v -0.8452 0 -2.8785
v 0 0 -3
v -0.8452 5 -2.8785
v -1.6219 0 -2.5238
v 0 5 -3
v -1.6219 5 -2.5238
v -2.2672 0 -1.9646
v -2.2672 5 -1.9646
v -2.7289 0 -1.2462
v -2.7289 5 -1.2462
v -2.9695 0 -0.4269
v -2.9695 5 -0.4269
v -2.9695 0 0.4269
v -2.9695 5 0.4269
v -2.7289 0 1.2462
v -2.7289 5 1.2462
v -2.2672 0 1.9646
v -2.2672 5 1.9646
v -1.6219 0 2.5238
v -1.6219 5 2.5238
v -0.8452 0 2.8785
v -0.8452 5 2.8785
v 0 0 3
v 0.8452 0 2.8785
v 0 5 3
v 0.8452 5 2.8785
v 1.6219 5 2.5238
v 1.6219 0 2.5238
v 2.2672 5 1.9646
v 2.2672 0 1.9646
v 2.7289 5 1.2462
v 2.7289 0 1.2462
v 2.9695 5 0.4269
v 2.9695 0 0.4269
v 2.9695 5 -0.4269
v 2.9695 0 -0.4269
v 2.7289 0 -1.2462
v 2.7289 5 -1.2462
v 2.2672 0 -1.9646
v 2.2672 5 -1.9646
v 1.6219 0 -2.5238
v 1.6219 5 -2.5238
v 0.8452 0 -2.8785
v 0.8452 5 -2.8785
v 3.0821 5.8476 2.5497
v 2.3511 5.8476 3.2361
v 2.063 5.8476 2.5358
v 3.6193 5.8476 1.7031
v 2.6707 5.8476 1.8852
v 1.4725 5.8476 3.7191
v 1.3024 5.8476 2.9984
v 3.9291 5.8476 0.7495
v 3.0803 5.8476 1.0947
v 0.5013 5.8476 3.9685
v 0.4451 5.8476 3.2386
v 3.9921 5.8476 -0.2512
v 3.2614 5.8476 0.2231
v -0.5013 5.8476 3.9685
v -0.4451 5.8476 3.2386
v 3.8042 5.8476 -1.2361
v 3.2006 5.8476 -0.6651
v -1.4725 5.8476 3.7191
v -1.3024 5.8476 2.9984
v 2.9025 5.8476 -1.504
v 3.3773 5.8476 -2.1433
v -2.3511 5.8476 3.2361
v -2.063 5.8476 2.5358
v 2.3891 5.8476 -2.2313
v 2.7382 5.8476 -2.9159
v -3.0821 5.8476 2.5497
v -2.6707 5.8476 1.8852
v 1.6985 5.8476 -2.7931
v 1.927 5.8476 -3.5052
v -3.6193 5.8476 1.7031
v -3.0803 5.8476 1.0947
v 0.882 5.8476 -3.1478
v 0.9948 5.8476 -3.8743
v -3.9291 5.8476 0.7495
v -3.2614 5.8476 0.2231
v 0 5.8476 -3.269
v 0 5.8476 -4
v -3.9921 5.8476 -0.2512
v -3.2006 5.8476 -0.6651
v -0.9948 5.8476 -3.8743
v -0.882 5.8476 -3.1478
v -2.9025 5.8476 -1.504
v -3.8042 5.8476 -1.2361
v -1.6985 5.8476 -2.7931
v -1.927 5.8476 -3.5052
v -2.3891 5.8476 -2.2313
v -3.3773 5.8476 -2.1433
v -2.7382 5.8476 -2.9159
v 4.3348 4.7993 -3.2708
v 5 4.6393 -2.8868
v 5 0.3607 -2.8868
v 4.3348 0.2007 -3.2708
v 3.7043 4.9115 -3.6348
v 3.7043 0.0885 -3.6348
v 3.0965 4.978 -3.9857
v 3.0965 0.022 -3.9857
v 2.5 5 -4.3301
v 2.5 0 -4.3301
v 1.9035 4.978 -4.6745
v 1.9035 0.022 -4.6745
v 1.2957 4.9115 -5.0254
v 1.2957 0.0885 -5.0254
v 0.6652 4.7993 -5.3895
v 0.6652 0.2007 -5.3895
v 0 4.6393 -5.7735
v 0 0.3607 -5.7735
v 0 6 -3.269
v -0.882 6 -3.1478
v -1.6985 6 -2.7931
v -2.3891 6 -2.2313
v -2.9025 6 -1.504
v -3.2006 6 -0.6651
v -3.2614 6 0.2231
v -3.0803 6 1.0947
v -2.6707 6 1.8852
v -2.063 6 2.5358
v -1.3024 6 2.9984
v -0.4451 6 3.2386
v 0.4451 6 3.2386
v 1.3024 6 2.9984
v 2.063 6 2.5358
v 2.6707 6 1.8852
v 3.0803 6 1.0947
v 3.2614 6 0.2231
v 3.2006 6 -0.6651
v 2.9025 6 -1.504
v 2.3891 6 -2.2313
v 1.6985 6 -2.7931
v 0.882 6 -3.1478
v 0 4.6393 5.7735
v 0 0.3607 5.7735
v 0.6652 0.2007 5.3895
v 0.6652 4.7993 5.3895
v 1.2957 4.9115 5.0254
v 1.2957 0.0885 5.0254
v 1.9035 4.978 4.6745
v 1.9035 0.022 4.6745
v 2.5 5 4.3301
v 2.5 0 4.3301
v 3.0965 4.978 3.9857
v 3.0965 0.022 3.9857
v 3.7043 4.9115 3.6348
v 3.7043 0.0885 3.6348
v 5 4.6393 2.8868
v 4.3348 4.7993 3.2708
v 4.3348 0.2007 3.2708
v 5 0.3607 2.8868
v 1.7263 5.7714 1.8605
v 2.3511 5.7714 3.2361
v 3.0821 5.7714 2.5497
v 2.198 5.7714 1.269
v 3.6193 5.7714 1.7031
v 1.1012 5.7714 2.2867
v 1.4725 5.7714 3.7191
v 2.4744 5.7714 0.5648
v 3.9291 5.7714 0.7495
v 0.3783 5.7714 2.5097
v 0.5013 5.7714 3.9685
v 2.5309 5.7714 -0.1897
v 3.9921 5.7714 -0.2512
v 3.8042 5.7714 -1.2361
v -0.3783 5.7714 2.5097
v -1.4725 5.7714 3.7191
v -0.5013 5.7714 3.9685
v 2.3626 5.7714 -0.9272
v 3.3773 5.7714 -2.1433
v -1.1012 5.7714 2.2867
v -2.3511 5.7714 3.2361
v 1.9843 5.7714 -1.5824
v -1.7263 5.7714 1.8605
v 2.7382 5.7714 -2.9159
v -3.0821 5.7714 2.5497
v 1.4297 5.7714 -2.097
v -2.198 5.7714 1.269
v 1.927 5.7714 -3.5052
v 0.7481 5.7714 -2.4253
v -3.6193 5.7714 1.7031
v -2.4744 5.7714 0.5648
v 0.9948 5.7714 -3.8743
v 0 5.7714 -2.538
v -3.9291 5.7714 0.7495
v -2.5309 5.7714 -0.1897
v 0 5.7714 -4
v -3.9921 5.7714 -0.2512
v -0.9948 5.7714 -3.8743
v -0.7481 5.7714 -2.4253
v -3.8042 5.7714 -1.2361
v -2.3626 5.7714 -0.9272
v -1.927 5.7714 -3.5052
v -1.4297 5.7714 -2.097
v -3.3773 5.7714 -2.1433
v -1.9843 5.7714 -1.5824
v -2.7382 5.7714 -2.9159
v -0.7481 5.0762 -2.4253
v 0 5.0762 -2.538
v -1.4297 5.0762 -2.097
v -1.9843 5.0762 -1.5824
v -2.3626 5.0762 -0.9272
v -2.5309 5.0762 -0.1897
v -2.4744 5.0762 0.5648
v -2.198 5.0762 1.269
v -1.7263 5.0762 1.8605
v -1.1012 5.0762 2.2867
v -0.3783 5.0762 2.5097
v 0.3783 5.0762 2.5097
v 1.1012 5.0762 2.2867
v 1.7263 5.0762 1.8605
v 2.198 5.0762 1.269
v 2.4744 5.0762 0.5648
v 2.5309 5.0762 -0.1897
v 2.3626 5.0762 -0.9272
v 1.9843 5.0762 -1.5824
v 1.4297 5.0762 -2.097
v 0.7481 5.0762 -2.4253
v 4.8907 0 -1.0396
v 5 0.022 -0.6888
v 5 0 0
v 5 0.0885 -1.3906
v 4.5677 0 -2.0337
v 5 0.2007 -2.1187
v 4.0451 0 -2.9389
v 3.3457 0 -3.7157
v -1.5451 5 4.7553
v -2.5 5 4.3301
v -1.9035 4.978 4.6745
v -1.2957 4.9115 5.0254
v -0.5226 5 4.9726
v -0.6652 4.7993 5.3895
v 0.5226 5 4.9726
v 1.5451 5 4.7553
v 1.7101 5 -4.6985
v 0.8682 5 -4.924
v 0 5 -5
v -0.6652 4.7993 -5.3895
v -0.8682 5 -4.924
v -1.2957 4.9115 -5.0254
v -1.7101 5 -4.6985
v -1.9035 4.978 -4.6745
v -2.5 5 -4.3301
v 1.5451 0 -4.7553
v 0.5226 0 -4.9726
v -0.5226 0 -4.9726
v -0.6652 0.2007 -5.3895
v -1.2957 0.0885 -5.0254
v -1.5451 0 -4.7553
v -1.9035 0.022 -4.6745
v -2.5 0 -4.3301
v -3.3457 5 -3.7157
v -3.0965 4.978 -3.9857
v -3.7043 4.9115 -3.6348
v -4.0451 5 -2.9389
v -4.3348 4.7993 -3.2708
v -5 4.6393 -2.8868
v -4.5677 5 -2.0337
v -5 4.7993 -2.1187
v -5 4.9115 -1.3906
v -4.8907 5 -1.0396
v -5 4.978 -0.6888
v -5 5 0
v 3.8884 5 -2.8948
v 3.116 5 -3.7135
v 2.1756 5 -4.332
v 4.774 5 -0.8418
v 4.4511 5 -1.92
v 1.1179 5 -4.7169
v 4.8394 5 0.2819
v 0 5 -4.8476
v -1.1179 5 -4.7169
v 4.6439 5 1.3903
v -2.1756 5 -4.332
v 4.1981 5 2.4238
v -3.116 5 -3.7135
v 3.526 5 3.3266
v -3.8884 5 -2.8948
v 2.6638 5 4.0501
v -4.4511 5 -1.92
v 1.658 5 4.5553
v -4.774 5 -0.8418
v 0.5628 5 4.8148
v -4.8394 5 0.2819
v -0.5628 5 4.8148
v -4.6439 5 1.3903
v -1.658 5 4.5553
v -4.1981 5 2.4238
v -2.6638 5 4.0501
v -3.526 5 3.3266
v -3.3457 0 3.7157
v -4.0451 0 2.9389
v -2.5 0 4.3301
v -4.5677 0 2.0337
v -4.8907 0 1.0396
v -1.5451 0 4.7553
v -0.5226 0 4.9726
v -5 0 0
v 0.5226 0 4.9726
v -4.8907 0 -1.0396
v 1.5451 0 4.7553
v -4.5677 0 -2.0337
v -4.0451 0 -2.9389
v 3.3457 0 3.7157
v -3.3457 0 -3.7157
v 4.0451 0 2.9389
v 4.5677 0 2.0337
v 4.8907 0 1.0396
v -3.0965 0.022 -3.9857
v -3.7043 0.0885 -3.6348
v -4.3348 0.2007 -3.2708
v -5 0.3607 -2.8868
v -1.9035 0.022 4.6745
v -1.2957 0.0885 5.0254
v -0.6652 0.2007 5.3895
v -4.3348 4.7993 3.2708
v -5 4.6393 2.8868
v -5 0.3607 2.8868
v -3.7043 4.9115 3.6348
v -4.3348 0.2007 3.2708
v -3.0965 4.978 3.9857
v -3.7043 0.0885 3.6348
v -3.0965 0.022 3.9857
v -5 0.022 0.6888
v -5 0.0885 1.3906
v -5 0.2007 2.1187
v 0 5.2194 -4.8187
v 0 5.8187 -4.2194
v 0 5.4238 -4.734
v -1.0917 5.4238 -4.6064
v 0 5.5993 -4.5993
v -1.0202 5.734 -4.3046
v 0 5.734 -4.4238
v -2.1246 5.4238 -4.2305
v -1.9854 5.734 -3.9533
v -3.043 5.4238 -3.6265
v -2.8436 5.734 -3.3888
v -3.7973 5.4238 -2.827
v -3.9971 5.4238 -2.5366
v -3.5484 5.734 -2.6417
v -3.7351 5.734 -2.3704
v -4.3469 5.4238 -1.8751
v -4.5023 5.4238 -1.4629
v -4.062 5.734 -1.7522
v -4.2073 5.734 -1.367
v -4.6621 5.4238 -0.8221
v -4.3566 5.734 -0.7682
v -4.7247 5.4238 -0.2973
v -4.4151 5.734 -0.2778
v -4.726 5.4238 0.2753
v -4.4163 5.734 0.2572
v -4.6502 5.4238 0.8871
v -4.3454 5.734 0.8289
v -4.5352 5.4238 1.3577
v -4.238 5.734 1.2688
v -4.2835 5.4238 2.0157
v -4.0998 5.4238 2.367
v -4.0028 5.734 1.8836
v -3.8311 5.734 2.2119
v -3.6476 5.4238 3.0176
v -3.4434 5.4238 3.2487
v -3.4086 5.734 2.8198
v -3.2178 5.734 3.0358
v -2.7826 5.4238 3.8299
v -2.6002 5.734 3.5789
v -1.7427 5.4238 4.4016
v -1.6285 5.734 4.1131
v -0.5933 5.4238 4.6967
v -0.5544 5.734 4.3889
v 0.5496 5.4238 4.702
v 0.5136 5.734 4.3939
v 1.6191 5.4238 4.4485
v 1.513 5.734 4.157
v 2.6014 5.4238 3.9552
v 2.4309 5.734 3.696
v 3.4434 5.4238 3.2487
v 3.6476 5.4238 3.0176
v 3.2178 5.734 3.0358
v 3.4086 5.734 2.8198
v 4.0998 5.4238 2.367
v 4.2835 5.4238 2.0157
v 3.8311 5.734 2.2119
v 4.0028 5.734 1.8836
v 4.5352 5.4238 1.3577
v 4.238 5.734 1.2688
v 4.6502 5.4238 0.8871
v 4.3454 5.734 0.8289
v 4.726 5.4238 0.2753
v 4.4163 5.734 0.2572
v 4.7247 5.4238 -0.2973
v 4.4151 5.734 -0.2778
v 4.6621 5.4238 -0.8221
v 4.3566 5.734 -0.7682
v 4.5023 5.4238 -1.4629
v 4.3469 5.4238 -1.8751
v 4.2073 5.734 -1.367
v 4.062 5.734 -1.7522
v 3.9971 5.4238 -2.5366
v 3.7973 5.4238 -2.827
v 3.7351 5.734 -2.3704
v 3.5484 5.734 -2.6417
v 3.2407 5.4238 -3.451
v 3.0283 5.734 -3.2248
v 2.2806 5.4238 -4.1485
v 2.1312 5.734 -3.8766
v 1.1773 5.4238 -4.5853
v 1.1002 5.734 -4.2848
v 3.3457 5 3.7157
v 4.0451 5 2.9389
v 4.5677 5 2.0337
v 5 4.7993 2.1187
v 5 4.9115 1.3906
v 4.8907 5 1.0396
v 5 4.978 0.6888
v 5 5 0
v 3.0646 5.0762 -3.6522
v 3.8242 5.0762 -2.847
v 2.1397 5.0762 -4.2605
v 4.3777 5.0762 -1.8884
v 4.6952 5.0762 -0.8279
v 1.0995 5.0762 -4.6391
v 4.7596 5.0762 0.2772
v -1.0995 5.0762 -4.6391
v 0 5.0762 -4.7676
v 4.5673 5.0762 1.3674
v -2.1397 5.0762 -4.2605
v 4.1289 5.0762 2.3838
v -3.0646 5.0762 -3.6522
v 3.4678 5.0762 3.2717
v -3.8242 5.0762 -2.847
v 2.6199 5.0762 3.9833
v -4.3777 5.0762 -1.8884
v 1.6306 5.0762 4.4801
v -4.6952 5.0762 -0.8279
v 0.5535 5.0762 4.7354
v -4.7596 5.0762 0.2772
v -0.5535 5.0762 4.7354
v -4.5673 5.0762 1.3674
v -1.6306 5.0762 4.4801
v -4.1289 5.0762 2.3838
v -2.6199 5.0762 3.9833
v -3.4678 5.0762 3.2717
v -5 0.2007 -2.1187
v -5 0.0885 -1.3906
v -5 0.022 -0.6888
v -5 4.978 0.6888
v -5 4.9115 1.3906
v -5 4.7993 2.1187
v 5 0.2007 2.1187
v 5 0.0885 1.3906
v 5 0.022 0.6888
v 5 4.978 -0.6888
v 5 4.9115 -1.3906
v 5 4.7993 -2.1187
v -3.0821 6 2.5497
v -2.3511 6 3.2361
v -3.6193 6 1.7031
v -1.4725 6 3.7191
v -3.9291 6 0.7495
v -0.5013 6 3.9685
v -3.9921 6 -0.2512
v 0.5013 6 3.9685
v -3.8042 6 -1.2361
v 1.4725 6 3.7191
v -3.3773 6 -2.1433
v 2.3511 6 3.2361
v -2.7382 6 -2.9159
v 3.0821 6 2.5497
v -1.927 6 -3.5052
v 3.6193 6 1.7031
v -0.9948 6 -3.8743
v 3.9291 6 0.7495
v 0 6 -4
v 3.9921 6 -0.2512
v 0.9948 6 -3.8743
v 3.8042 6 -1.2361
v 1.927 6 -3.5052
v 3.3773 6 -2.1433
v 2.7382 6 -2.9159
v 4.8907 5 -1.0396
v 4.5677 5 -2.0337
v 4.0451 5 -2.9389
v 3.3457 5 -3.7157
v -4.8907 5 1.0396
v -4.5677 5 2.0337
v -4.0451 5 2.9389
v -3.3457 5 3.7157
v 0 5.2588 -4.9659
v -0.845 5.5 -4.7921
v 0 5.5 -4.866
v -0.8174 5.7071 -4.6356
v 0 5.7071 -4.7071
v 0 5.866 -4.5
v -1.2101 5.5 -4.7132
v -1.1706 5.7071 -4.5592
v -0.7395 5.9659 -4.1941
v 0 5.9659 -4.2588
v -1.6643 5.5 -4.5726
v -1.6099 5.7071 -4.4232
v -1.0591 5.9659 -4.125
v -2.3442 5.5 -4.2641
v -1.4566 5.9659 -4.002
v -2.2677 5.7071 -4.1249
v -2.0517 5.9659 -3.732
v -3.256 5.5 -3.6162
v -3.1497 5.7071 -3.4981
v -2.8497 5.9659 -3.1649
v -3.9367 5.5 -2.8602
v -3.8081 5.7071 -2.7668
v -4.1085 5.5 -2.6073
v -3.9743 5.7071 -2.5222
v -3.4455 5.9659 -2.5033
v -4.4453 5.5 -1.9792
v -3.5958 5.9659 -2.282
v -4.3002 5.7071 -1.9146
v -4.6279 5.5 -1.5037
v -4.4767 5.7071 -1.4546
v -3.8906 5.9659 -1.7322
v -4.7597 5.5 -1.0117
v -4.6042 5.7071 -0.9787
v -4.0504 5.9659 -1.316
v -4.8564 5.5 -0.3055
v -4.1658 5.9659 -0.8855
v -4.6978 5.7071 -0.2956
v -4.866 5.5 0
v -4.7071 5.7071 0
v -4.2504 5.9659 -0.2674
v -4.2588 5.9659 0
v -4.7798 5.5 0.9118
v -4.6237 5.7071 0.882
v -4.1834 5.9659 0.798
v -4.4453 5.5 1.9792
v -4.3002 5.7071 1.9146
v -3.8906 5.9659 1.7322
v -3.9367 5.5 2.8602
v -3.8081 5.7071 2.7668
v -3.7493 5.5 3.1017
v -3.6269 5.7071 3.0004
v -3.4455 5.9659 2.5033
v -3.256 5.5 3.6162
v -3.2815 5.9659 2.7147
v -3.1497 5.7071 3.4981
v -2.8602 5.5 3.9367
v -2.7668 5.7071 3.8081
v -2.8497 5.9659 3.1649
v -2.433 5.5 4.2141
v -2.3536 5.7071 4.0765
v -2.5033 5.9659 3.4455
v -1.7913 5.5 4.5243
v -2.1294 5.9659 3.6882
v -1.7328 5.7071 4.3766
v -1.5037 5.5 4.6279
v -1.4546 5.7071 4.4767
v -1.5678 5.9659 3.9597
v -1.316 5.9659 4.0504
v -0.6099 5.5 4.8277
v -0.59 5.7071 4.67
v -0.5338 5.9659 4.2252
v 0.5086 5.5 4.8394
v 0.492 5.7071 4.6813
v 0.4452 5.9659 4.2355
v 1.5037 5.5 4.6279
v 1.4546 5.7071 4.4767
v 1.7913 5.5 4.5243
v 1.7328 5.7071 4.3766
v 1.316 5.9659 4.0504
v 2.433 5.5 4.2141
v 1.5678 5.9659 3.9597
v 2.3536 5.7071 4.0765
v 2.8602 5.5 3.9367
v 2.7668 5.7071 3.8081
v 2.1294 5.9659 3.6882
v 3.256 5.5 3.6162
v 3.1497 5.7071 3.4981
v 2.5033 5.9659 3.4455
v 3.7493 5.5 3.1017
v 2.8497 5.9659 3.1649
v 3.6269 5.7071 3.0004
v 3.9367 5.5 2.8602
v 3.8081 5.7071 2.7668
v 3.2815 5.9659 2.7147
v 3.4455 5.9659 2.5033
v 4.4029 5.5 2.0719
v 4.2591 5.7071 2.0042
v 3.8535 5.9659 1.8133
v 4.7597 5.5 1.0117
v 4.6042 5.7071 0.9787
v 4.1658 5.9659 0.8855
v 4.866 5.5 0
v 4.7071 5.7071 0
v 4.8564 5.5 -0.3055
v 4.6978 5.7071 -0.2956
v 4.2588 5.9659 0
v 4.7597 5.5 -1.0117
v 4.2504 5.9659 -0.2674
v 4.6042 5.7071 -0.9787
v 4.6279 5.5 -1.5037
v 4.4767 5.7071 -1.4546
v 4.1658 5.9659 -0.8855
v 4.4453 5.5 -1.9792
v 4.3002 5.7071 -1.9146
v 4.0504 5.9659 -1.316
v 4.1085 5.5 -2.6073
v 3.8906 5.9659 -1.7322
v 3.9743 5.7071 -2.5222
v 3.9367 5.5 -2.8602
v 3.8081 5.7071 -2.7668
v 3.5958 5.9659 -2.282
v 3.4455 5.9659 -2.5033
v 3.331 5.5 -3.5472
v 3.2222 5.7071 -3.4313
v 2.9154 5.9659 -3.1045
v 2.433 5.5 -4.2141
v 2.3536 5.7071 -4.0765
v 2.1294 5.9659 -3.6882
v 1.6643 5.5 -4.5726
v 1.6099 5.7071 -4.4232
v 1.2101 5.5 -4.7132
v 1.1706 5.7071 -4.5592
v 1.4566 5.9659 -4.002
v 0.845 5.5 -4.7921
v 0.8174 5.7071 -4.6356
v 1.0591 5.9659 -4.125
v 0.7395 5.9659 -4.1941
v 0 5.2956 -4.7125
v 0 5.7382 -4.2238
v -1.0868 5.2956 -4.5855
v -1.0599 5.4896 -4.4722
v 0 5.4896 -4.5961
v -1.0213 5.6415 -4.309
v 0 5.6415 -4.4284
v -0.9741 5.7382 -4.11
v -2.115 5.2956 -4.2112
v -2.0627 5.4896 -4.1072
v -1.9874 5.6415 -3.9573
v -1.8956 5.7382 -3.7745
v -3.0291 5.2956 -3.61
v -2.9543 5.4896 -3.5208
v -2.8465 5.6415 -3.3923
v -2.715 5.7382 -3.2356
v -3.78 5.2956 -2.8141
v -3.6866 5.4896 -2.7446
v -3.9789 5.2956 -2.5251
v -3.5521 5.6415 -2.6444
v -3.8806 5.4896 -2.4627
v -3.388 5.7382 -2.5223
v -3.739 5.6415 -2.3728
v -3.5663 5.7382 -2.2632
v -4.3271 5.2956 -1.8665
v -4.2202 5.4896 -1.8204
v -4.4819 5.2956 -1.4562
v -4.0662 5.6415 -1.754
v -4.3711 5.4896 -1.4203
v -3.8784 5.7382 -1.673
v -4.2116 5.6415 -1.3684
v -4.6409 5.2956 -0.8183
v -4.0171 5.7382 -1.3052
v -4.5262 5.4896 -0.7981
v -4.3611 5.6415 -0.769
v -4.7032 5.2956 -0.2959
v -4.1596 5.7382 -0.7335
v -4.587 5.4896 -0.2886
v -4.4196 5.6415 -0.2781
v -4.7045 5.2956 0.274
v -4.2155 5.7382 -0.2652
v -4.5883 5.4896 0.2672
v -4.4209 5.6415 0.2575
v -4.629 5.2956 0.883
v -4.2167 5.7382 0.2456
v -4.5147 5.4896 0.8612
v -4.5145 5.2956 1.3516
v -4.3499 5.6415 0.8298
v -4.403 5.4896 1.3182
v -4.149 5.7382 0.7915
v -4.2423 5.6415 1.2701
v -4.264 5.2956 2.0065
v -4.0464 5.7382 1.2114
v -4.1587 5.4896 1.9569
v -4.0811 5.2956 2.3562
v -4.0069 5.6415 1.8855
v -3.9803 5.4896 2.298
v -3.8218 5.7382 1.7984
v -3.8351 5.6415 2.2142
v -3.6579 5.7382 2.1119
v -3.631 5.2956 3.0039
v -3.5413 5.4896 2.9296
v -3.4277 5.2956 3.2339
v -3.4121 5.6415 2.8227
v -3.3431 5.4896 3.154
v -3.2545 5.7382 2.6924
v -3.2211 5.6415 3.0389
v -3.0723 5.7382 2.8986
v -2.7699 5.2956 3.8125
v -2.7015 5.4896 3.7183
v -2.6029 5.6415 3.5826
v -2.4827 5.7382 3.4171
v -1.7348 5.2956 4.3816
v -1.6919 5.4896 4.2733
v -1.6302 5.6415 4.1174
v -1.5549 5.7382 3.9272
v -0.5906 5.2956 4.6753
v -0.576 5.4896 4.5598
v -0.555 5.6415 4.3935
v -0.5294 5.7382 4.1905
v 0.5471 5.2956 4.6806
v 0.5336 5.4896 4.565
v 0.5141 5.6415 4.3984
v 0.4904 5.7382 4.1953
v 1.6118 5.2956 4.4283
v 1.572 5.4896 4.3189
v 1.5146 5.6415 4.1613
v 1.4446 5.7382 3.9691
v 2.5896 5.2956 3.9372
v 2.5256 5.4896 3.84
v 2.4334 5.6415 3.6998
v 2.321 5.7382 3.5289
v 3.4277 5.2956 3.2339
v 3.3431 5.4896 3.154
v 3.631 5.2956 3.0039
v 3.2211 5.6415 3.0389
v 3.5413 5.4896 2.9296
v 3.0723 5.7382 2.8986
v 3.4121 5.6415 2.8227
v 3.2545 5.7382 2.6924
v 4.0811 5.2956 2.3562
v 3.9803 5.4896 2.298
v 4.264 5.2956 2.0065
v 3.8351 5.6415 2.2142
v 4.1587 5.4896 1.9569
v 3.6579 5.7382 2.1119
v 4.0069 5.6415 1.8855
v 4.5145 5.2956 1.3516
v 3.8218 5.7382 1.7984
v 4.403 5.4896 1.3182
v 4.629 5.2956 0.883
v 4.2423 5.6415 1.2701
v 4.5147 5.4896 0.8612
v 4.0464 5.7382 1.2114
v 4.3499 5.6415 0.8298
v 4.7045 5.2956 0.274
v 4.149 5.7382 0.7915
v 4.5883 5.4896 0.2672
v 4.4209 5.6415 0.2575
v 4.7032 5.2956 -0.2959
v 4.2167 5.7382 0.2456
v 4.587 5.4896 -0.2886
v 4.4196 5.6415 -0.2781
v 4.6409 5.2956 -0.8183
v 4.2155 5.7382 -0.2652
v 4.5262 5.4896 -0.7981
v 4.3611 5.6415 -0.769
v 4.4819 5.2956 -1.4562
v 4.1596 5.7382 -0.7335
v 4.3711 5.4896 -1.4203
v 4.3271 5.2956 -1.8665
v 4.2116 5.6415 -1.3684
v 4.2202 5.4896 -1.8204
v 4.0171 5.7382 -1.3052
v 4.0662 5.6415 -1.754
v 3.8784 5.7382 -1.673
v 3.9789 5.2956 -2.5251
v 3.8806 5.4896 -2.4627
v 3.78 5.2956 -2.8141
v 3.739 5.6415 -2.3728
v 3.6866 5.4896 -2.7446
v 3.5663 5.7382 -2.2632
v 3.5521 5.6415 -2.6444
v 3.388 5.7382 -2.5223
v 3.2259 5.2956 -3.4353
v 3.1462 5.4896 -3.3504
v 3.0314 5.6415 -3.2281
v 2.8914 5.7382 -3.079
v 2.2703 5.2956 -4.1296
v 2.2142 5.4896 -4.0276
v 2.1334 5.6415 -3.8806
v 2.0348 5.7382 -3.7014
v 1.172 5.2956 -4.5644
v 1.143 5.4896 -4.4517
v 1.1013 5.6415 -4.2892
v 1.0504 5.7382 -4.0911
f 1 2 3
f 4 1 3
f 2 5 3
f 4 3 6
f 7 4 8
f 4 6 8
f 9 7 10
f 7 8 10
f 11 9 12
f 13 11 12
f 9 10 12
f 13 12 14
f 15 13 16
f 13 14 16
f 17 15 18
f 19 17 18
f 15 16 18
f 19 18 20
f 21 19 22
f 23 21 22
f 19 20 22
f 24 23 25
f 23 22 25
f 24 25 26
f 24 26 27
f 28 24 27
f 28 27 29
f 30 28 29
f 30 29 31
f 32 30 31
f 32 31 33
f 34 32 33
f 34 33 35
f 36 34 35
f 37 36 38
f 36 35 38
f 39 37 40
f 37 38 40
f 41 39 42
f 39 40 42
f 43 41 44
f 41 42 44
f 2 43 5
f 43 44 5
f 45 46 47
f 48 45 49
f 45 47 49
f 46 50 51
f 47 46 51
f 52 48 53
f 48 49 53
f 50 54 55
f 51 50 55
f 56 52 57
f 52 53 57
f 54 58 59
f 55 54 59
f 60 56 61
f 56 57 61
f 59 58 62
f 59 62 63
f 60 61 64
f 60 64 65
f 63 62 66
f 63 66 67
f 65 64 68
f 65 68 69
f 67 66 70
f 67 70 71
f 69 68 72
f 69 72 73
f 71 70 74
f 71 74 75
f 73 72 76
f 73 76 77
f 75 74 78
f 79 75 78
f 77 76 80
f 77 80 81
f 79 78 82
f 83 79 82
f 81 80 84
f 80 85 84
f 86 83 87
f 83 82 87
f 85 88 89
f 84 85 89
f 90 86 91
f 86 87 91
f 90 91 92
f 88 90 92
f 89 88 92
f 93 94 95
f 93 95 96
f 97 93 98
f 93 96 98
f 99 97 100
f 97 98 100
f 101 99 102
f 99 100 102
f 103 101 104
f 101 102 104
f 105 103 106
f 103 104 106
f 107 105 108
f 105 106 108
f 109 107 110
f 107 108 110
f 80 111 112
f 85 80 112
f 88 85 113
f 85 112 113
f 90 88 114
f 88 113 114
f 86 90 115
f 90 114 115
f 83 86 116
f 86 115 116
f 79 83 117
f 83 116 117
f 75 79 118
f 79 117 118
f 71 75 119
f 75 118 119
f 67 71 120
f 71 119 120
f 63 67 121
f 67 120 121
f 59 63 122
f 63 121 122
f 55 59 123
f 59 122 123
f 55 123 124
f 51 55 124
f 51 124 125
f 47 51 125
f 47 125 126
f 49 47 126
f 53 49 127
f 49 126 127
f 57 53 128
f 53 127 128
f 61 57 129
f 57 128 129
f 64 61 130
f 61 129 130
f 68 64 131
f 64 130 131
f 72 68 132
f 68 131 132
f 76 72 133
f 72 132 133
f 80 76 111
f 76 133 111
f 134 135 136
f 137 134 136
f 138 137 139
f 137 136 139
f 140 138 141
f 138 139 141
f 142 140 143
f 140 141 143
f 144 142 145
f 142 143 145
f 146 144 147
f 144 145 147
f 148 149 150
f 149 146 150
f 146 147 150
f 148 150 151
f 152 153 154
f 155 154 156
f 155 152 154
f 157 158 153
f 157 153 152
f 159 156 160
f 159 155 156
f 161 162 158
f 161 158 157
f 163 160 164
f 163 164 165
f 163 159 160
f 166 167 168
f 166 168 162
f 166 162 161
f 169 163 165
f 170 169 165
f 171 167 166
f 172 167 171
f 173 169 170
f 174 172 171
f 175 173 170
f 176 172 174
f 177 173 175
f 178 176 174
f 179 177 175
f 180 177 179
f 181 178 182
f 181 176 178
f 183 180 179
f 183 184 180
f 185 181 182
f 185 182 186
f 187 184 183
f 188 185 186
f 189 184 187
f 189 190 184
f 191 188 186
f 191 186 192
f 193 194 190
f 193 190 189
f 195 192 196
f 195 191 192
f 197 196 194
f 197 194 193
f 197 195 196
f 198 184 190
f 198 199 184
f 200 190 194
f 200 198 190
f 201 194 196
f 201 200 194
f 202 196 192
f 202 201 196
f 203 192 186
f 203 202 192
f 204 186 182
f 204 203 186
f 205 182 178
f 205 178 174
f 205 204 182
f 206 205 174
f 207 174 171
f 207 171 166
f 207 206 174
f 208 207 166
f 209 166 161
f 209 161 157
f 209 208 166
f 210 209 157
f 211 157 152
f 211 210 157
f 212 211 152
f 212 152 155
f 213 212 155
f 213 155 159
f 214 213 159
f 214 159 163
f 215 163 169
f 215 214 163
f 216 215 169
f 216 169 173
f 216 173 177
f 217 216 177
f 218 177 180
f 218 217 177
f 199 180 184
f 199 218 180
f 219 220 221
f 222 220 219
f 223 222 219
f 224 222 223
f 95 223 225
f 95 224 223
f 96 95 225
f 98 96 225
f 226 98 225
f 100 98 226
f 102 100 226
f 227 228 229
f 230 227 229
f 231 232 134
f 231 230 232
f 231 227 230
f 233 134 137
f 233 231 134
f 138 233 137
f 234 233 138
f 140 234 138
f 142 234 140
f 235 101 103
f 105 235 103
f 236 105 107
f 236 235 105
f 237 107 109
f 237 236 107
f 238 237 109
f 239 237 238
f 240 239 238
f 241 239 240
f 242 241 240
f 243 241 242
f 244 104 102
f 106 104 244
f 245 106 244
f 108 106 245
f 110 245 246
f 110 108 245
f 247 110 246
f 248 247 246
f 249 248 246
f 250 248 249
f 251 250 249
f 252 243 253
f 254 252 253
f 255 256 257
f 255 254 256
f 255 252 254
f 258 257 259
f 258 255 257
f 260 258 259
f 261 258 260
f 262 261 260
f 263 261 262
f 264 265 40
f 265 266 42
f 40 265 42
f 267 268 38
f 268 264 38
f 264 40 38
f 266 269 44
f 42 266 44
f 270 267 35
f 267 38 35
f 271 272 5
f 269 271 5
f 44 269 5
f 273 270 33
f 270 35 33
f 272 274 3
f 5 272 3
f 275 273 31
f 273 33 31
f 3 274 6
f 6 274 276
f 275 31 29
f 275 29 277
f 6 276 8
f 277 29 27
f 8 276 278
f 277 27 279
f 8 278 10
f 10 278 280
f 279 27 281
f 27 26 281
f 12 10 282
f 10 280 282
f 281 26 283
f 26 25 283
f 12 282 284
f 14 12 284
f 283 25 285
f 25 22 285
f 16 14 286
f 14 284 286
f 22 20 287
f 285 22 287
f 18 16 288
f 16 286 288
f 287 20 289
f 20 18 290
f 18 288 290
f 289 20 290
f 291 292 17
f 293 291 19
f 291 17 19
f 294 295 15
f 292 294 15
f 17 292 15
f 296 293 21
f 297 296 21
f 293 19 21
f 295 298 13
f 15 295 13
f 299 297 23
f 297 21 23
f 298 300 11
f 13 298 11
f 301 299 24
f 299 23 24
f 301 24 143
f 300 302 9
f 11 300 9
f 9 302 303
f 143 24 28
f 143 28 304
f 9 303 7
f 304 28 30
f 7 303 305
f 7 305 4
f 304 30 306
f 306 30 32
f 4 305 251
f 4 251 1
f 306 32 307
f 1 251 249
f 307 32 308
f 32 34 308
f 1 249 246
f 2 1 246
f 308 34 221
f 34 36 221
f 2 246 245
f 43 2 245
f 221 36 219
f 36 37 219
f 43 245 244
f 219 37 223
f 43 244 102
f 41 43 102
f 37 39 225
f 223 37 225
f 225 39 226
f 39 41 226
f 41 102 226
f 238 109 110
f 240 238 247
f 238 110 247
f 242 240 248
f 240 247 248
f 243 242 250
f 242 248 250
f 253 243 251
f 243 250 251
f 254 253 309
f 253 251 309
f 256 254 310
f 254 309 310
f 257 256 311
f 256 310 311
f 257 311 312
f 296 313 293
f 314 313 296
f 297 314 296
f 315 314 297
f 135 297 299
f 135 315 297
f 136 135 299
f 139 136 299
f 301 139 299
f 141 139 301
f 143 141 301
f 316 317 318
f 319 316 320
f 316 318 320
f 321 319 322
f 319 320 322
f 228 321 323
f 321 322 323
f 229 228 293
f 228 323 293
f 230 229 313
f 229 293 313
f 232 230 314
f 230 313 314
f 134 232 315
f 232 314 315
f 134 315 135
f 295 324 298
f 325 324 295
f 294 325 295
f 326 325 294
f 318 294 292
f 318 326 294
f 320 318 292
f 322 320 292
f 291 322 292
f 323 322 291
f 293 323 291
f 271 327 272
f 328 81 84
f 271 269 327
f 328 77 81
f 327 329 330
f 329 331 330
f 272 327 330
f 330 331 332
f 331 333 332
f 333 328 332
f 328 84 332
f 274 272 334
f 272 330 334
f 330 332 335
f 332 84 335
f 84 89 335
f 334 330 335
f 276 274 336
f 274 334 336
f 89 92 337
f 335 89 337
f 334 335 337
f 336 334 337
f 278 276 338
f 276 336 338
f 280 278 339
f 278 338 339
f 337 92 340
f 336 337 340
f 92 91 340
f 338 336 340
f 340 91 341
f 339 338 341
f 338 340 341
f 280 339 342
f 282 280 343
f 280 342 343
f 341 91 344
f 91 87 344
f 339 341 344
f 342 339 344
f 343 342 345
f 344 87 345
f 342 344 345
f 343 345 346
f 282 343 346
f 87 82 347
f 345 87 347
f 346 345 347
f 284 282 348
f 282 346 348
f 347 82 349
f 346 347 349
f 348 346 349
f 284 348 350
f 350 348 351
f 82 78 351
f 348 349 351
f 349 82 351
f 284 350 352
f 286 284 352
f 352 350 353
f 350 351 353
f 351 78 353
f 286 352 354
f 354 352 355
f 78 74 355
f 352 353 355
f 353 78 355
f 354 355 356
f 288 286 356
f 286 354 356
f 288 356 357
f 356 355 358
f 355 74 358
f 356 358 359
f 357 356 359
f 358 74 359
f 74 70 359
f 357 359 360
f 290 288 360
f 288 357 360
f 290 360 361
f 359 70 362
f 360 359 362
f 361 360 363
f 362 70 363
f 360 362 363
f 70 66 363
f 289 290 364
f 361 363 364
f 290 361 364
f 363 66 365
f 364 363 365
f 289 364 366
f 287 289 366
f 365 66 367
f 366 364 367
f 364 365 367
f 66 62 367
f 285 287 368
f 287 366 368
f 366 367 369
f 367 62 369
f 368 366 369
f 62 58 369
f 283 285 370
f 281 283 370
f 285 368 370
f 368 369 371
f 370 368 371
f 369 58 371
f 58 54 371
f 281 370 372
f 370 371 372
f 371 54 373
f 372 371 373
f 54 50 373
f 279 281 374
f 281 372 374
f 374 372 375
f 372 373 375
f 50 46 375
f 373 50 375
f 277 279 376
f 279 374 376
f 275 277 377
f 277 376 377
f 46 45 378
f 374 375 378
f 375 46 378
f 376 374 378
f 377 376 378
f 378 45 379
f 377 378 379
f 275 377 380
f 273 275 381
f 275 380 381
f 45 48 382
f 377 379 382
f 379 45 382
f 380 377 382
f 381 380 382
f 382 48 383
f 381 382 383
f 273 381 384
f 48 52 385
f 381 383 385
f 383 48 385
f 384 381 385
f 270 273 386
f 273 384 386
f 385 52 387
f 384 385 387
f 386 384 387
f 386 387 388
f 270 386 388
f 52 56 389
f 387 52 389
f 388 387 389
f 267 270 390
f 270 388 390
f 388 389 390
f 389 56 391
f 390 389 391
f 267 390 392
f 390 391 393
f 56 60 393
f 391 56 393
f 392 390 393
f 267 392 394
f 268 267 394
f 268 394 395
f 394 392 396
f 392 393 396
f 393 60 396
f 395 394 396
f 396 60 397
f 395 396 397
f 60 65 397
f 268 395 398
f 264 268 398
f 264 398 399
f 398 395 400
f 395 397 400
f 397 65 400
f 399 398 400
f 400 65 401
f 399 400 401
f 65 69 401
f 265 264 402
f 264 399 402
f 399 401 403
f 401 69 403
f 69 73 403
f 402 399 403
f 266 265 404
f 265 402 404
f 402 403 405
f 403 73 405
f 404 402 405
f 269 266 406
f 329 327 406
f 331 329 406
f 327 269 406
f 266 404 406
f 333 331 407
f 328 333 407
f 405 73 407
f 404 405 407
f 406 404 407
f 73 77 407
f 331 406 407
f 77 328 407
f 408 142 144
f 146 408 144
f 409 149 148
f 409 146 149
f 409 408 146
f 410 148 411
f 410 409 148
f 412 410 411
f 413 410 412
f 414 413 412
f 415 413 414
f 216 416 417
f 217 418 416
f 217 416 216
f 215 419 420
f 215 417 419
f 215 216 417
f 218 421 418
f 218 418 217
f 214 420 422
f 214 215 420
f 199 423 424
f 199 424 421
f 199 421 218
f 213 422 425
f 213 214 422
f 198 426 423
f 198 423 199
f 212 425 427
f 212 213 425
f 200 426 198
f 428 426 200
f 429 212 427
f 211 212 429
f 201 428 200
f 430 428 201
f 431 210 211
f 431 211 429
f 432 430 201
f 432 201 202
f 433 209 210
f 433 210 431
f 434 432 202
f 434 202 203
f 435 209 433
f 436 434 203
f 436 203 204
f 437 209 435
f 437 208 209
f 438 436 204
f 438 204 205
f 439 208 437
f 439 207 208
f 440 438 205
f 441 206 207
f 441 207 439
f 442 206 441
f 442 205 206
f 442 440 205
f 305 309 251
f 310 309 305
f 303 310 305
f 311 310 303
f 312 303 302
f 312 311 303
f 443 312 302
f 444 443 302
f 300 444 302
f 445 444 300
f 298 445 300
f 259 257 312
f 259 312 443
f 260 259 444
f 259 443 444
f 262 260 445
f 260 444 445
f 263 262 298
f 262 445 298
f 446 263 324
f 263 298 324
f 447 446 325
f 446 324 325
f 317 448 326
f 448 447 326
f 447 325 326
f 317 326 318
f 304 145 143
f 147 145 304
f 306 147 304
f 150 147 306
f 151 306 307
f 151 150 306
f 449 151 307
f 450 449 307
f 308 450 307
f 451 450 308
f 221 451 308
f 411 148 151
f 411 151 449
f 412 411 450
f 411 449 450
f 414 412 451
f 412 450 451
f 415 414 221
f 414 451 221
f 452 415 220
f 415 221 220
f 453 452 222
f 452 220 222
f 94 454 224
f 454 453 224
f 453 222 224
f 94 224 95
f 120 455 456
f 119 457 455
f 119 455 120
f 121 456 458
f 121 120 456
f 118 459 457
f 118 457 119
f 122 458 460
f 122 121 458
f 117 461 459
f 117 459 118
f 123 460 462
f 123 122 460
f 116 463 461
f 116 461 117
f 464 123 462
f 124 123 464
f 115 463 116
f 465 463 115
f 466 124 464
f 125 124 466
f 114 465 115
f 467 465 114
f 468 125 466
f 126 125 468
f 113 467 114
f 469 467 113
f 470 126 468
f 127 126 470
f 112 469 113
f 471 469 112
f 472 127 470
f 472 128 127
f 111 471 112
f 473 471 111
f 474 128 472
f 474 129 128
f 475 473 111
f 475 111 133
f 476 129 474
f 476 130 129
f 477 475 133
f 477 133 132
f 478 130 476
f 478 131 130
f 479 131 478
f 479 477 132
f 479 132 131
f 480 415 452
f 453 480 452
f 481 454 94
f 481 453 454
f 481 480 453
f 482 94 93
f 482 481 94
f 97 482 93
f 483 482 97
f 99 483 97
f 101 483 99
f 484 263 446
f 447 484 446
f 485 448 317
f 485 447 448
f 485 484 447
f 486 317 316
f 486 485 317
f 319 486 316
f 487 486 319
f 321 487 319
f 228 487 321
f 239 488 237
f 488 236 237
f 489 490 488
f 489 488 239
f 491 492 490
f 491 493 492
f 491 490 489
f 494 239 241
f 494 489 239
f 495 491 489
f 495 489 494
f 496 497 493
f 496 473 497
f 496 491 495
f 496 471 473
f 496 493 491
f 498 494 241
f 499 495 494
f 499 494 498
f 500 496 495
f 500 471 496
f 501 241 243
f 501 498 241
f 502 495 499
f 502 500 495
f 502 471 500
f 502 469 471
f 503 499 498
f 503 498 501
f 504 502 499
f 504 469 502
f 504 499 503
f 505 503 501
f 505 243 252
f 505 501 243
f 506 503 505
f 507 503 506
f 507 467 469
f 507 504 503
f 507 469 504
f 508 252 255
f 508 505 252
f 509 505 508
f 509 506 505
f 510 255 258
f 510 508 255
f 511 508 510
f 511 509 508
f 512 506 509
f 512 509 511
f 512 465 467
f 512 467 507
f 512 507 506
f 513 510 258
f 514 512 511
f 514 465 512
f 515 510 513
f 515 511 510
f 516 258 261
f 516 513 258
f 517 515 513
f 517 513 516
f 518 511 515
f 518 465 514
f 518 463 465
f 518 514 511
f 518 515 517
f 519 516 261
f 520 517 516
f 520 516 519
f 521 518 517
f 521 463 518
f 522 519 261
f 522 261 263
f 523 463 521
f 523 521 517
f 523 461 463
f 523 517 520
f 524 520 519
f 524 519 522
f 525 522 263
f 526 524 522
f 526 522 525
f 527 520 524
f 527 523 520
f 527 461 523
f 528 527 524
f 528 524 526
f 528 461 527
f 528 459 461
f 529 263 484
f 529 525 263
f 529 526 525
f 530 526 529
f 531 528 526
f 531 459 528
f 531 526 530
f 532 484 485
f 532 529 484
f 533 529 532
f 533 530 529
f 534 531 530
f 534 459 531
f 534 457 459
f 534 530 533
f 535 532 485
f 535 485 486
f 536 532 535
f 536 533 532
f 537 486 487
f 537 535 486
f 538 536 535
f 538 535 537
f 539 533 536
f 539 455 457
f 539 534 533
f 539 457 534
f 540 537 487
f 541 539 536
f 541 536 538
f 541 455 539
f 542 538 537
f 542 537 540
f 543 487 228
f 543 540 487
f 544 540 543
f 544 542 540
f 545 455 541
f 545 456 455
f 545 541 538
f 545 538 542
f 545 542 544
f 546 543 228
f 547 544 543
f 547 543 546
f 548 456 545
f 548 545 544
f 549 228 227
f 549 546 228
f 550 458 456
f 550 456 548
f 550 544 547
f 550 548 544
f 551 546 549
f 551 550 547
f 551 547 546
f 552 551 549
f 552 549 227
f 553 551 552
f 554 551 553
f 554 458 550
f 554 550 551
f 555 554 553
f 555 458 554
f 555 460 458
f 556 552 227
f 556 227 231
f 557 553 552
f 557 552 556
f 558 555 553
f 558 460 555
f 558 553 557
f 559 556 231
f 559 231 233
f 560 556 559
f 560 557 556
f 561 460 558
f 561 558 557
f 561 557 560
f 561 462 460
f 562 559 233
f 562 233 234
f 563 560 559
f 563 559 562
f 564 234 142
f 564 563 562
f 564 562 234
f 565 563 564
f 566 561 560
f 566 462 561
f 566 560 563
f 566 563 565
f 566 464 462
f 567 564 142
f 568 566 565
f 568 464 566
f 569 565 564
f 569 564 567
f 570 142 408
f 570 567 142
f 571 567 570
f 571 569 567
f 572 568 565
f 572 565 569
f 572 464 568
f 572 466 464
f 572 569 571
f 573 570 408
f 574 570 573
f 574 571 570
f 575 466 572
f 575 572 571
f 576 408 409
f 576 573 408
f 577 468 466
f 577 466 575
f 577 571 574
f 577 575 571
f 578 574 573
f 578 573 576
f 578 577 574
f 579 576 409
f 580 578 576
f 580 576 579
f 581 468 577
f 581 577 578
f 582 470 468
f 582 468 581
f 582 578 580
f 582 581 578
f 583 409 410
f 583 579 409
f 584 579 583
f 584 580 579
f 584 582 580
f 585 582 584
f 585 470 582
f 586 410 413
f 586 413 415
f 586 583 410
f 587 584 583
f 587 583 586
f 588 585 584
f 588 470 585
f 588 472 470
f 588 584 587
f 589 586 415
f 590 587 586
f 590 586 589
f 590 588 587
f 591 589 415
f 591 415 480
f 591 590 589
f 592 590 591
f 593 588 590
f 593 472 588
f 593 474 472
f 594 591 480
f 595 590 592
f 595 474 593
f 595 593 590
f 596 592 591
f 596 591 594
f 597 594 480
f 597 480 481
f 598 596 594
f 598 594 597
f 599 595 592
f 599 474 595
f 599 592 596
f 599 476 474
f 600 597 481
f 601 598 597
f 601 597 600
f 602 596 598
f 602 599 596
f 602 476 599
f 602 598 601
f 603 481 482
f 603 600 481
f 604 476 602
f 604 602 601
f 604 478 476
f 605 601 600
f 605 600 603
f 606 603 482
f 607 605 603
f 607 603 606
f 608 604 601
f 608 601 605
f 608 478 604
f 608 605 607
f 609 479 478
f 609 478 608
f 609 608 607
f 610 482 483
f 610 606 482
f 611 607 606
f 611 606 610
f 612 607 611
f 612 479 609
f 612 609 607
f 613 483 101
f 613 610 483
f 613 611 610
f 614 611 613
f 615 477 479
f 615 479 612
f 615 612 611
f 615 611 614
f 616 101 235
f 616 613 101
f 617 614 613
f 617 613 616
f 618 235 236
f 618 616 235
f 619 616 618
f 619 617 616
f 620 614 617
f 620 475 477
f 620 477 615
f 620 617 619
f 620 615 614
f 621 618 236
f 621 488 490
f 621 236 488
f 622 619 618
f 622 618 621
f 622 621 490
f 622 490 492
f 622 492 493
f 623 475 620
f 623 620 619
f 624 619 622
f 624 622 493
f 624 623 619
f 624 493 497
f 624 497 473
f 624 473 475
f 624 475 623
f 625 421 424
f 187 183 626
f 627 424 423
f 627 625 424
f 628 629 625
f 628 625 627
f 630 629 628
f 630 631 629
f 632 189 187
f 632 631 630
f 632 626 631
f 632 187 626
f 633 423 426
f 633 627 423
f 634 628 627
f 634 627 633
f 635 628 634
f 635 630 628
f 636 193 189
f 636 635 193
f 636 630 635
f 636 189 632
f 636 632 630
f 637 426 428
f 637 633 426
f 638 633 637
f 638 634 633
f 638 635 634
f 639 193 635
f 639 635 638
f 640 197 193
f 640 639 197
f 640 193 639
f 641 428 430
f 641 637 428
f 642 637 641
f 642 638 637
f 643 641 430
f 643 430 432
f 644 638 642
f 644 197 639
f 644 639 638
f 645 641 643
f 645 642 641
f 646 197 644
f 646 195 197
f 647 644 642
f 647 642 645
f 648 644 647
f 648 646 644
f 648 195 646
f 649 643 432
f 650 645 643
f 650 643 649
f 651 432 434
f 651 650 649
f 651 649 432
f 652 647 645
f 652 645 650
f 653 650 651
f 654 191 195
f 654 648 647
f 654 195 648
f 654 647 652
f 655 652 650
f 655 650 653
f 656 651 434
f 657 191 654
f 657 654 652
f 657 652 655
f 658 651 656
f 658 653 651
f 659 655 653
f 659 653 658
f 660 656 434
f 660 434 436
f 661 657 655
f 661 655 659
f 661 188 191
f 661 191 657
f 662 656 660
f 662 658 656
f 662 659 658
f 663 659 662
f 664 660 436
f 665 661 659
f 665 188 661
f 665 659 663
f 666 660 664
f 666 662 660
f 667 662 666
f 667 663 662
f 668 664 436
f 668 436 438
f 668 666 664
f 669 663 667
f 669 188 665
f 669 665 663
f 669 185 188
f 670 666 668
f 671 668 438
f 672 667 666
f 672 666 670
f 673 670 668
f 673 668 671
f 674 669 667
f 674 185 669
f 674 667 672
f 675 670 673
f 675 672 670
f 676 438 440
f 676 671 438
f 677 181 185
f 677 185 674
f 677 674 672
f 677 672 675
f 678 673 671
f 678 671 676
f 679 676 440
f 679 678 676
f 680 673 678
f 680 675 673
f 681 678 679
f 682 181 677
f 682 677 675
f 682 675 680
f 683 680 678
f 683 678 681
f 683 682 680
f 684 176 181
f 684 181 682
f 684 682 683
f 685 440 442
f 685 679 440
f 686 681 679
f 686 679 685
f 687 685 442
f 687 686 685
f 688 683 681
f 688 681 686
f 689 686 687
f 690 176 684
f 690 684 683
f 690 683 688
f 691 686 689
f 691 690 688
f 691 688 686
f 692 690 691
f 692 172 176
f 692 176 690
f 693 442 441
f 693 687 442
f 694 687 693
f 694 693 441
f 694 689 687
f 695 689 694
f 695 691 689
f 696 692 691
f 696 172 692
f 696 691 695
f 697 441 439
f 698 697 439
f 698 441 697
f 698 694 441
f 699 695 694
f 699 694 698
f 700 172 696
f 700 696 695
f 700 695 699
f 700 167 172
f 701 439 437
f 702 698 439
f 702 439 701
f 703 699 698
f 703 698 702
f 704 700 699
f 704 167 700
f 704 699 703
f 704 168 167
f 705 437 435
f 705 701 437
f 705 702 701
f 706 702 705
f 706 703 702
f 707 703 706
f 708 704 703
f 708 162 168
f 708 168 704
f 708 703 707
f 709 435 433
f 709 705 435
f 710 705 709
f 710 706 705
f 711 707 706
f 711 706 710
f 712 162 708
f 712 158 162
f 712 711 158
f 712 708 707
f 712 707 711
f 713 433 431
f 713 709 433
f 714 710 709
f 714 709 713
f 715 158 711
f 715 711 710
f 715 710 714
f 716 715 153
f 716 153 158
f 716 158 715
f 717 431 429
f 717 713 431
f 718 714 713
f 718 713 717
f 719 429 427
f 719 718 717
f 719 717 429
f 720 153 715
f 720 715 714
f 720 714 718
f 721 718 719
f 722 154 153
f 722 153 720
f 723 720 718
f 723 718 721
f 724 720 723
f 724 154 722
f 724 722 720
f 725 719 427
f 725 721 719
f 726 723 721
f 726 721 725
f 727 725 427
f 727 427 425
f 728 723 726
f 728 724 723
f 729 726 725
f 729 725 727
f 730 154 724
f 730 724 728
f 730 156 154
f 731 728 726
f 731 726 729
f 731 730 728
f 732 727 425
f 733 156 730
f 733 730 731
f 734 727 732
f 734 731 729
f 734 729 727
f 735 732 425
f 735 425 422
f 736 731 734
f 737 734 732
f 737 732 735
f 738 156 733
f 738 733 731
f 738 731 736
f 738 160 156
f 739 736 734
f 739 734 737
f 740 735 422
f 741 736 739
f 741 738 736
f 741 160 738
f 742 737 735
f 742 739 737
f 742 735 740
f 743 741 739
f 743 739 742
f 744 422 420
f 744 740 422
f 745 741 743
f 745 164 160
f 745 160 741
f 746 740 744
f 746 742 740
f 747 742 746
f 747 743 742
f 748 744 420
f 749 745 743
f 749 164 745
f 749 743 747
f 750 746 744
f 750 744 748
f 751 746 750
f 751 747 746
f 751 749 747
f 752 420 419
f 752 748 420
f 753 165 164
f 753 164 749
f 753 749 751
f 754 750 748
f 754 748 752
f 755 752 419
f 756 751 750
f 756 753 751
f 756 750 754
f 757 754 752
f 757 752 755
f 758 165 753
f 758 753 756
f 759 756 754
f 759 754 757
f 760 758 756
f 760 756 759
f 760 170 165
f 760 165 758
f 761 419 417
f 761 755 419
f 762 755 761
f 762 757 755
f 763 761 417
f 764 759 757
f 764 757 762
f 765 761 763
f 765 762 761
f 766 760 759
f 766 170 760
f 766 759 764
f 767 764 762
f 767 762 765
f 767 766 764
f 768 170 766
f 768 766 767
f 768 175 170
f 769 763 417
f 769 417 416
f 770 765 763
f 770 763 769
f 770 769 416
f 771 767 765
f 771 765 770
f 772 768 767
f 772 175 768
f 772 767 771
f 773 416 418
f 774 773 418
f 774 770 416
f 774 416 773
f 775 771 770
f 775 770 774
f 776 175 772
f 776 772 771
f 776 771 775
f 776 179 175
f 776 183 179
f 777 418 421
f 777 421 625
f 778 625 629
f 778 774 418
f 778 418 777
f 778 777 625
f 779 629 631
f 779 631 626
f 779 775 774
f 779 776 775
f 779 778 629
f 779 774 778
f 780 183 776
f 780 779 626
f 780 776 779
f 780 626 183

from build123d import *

# Parameters (mm, degrees)
EXTRUDE1_DEPTH = 6
SKETCH2_W      = 3
SKETCH2_H      = 6


with BuildPart() as part:
    # Sketch1 → Extrude1 (new body)
    with BuildSketch(Plane(origin=(0, 0, 0), x_dir=(1, 0, 0), z_dir=(0, 1, 0))):
        Polygon((0, 5.773502692), (-5, 2.886751346), (-5, -2.886751346), (0, -5.773502692), (5, -2.886751346), (5, 2.886751346), align=None)
    extrude(amount=EXTRUDE1_DEPTH)

    # Sketch4 → Cut-Revolve2 (revolve, cut)
    with BuildSketch(Plane(origin=(0, 0, 0), x_dir=(0, 0, -1), z_dir=(1, 0, 0))):
        Polygon((0, 6), (3, 6), (2.538023184, 5.784576673), (2.538023184, 0.215423327), (3, 0), (0, 0), align=None)
    revolve(axis=Axis((0, 6, 0), (0, 1, 0)), mode=Mode.SUBTRACT)


with BuildPart() as body_2:
    # Sketch2 → Revolve1 (revolve)
    with BuildSketch(Plane(origin=(0, 0, 0), x_dir=(0, 0, -1), z_dir=(1, 0, 0))):
        with Locations((1.5, 3)):
            Rectangle(SKETCH2_W, SKETCH2_H)
    revolve(axis=Axis((0, -3, 0), (0, 1, 0)))


with BuildPart() as part_1:
    add(part.part)

    # Combine1: cut body 2
    add(body_2.part, mode=Mode.SUBTRACT)

    # Sketch5 → Cut-Revolve3 (revolve, cut)
    with BuildSketch(Plane(origin=(0, 0, 0), x_dir=(0, 0, -1), z_dir=(1, 0, 0))):
        with BuildLine():
            Line((0, 0), (5, 0))
            Line((5, 0), (5.773502692, 0.360690229))
            Line((5.773502692, 0.360690229), (5.773502692, 4.639309771))
            Line((5.773502692, 4.639309771), (5, 5))
            ThreePointArc((5, 5), (4.707106781, 5.707106781), (4, 6))
            Line((4, 6), (4, 7.27))
            Line((4, 7.27), (7.043502692, 7.27))
            Line((7.043502692, 7.27), (7.043502692, -1.27))
            Line((7.043502692, -1.27), (0, -1.27))
            Line((0, -1.27), (0, 0))
        make_face()
    revolve(axis=Axis((0, 0, 0), (0, 1, 0)), mode=Mode.SUBTRACT)

    # Sketch6 → Cut-Revolve4 (revolve, cut)
    with BuildSketch(Plane(origin=(0, 0, 0), x_dir=(0, 0, -1), z_dir=(1, 0, 0))):
        with BuildLine():
            Line((0, 5), (4.8476, 5))
            ThreePointArc((4.8476, 5), (4.599343708, 5.599343708), (4, 5.8476))
            Line((4, 5.8476), (3.269011592, 5.8476))
            Line((3.269011592, 5.8476), (3.269011592, 7.27))
            Line((3.269011592, 7.27), (0, 7.27))
            Line((0, 7.27), (0, 5))
        make_face()
    revolve(axis=Axis((0, 7.27, 0), (0, 1, 0)), mode=Mode.SUBTRACT)


with BuildPart() as body_2_2:
    # Sketch7 → Revolve2 (revolve)
    with BuildSketch(Plane(origin=(0, 0, 0), x_dir=(0, 0, -1), z_dir=(1, 0, 0))):
        with BuildLine():
            Line((2.538023184, 5.0762), (4.767627201, 5.0762))
            ThreePointArc((4.767627201, 5.0762), (4.51782105, 5.57176859), (4, 5.7714))
            Line((4, 5.7714), (2.538023184, 5.7714))
            Line((2.538023184, 5.7714), (2.538023184, 5.0762))
        make_face()
    revolve(axis=Axis((0, 5.0762, 0), (0, 1, 0)))


solid = Compound([part_1.part, body_2_2.part])
